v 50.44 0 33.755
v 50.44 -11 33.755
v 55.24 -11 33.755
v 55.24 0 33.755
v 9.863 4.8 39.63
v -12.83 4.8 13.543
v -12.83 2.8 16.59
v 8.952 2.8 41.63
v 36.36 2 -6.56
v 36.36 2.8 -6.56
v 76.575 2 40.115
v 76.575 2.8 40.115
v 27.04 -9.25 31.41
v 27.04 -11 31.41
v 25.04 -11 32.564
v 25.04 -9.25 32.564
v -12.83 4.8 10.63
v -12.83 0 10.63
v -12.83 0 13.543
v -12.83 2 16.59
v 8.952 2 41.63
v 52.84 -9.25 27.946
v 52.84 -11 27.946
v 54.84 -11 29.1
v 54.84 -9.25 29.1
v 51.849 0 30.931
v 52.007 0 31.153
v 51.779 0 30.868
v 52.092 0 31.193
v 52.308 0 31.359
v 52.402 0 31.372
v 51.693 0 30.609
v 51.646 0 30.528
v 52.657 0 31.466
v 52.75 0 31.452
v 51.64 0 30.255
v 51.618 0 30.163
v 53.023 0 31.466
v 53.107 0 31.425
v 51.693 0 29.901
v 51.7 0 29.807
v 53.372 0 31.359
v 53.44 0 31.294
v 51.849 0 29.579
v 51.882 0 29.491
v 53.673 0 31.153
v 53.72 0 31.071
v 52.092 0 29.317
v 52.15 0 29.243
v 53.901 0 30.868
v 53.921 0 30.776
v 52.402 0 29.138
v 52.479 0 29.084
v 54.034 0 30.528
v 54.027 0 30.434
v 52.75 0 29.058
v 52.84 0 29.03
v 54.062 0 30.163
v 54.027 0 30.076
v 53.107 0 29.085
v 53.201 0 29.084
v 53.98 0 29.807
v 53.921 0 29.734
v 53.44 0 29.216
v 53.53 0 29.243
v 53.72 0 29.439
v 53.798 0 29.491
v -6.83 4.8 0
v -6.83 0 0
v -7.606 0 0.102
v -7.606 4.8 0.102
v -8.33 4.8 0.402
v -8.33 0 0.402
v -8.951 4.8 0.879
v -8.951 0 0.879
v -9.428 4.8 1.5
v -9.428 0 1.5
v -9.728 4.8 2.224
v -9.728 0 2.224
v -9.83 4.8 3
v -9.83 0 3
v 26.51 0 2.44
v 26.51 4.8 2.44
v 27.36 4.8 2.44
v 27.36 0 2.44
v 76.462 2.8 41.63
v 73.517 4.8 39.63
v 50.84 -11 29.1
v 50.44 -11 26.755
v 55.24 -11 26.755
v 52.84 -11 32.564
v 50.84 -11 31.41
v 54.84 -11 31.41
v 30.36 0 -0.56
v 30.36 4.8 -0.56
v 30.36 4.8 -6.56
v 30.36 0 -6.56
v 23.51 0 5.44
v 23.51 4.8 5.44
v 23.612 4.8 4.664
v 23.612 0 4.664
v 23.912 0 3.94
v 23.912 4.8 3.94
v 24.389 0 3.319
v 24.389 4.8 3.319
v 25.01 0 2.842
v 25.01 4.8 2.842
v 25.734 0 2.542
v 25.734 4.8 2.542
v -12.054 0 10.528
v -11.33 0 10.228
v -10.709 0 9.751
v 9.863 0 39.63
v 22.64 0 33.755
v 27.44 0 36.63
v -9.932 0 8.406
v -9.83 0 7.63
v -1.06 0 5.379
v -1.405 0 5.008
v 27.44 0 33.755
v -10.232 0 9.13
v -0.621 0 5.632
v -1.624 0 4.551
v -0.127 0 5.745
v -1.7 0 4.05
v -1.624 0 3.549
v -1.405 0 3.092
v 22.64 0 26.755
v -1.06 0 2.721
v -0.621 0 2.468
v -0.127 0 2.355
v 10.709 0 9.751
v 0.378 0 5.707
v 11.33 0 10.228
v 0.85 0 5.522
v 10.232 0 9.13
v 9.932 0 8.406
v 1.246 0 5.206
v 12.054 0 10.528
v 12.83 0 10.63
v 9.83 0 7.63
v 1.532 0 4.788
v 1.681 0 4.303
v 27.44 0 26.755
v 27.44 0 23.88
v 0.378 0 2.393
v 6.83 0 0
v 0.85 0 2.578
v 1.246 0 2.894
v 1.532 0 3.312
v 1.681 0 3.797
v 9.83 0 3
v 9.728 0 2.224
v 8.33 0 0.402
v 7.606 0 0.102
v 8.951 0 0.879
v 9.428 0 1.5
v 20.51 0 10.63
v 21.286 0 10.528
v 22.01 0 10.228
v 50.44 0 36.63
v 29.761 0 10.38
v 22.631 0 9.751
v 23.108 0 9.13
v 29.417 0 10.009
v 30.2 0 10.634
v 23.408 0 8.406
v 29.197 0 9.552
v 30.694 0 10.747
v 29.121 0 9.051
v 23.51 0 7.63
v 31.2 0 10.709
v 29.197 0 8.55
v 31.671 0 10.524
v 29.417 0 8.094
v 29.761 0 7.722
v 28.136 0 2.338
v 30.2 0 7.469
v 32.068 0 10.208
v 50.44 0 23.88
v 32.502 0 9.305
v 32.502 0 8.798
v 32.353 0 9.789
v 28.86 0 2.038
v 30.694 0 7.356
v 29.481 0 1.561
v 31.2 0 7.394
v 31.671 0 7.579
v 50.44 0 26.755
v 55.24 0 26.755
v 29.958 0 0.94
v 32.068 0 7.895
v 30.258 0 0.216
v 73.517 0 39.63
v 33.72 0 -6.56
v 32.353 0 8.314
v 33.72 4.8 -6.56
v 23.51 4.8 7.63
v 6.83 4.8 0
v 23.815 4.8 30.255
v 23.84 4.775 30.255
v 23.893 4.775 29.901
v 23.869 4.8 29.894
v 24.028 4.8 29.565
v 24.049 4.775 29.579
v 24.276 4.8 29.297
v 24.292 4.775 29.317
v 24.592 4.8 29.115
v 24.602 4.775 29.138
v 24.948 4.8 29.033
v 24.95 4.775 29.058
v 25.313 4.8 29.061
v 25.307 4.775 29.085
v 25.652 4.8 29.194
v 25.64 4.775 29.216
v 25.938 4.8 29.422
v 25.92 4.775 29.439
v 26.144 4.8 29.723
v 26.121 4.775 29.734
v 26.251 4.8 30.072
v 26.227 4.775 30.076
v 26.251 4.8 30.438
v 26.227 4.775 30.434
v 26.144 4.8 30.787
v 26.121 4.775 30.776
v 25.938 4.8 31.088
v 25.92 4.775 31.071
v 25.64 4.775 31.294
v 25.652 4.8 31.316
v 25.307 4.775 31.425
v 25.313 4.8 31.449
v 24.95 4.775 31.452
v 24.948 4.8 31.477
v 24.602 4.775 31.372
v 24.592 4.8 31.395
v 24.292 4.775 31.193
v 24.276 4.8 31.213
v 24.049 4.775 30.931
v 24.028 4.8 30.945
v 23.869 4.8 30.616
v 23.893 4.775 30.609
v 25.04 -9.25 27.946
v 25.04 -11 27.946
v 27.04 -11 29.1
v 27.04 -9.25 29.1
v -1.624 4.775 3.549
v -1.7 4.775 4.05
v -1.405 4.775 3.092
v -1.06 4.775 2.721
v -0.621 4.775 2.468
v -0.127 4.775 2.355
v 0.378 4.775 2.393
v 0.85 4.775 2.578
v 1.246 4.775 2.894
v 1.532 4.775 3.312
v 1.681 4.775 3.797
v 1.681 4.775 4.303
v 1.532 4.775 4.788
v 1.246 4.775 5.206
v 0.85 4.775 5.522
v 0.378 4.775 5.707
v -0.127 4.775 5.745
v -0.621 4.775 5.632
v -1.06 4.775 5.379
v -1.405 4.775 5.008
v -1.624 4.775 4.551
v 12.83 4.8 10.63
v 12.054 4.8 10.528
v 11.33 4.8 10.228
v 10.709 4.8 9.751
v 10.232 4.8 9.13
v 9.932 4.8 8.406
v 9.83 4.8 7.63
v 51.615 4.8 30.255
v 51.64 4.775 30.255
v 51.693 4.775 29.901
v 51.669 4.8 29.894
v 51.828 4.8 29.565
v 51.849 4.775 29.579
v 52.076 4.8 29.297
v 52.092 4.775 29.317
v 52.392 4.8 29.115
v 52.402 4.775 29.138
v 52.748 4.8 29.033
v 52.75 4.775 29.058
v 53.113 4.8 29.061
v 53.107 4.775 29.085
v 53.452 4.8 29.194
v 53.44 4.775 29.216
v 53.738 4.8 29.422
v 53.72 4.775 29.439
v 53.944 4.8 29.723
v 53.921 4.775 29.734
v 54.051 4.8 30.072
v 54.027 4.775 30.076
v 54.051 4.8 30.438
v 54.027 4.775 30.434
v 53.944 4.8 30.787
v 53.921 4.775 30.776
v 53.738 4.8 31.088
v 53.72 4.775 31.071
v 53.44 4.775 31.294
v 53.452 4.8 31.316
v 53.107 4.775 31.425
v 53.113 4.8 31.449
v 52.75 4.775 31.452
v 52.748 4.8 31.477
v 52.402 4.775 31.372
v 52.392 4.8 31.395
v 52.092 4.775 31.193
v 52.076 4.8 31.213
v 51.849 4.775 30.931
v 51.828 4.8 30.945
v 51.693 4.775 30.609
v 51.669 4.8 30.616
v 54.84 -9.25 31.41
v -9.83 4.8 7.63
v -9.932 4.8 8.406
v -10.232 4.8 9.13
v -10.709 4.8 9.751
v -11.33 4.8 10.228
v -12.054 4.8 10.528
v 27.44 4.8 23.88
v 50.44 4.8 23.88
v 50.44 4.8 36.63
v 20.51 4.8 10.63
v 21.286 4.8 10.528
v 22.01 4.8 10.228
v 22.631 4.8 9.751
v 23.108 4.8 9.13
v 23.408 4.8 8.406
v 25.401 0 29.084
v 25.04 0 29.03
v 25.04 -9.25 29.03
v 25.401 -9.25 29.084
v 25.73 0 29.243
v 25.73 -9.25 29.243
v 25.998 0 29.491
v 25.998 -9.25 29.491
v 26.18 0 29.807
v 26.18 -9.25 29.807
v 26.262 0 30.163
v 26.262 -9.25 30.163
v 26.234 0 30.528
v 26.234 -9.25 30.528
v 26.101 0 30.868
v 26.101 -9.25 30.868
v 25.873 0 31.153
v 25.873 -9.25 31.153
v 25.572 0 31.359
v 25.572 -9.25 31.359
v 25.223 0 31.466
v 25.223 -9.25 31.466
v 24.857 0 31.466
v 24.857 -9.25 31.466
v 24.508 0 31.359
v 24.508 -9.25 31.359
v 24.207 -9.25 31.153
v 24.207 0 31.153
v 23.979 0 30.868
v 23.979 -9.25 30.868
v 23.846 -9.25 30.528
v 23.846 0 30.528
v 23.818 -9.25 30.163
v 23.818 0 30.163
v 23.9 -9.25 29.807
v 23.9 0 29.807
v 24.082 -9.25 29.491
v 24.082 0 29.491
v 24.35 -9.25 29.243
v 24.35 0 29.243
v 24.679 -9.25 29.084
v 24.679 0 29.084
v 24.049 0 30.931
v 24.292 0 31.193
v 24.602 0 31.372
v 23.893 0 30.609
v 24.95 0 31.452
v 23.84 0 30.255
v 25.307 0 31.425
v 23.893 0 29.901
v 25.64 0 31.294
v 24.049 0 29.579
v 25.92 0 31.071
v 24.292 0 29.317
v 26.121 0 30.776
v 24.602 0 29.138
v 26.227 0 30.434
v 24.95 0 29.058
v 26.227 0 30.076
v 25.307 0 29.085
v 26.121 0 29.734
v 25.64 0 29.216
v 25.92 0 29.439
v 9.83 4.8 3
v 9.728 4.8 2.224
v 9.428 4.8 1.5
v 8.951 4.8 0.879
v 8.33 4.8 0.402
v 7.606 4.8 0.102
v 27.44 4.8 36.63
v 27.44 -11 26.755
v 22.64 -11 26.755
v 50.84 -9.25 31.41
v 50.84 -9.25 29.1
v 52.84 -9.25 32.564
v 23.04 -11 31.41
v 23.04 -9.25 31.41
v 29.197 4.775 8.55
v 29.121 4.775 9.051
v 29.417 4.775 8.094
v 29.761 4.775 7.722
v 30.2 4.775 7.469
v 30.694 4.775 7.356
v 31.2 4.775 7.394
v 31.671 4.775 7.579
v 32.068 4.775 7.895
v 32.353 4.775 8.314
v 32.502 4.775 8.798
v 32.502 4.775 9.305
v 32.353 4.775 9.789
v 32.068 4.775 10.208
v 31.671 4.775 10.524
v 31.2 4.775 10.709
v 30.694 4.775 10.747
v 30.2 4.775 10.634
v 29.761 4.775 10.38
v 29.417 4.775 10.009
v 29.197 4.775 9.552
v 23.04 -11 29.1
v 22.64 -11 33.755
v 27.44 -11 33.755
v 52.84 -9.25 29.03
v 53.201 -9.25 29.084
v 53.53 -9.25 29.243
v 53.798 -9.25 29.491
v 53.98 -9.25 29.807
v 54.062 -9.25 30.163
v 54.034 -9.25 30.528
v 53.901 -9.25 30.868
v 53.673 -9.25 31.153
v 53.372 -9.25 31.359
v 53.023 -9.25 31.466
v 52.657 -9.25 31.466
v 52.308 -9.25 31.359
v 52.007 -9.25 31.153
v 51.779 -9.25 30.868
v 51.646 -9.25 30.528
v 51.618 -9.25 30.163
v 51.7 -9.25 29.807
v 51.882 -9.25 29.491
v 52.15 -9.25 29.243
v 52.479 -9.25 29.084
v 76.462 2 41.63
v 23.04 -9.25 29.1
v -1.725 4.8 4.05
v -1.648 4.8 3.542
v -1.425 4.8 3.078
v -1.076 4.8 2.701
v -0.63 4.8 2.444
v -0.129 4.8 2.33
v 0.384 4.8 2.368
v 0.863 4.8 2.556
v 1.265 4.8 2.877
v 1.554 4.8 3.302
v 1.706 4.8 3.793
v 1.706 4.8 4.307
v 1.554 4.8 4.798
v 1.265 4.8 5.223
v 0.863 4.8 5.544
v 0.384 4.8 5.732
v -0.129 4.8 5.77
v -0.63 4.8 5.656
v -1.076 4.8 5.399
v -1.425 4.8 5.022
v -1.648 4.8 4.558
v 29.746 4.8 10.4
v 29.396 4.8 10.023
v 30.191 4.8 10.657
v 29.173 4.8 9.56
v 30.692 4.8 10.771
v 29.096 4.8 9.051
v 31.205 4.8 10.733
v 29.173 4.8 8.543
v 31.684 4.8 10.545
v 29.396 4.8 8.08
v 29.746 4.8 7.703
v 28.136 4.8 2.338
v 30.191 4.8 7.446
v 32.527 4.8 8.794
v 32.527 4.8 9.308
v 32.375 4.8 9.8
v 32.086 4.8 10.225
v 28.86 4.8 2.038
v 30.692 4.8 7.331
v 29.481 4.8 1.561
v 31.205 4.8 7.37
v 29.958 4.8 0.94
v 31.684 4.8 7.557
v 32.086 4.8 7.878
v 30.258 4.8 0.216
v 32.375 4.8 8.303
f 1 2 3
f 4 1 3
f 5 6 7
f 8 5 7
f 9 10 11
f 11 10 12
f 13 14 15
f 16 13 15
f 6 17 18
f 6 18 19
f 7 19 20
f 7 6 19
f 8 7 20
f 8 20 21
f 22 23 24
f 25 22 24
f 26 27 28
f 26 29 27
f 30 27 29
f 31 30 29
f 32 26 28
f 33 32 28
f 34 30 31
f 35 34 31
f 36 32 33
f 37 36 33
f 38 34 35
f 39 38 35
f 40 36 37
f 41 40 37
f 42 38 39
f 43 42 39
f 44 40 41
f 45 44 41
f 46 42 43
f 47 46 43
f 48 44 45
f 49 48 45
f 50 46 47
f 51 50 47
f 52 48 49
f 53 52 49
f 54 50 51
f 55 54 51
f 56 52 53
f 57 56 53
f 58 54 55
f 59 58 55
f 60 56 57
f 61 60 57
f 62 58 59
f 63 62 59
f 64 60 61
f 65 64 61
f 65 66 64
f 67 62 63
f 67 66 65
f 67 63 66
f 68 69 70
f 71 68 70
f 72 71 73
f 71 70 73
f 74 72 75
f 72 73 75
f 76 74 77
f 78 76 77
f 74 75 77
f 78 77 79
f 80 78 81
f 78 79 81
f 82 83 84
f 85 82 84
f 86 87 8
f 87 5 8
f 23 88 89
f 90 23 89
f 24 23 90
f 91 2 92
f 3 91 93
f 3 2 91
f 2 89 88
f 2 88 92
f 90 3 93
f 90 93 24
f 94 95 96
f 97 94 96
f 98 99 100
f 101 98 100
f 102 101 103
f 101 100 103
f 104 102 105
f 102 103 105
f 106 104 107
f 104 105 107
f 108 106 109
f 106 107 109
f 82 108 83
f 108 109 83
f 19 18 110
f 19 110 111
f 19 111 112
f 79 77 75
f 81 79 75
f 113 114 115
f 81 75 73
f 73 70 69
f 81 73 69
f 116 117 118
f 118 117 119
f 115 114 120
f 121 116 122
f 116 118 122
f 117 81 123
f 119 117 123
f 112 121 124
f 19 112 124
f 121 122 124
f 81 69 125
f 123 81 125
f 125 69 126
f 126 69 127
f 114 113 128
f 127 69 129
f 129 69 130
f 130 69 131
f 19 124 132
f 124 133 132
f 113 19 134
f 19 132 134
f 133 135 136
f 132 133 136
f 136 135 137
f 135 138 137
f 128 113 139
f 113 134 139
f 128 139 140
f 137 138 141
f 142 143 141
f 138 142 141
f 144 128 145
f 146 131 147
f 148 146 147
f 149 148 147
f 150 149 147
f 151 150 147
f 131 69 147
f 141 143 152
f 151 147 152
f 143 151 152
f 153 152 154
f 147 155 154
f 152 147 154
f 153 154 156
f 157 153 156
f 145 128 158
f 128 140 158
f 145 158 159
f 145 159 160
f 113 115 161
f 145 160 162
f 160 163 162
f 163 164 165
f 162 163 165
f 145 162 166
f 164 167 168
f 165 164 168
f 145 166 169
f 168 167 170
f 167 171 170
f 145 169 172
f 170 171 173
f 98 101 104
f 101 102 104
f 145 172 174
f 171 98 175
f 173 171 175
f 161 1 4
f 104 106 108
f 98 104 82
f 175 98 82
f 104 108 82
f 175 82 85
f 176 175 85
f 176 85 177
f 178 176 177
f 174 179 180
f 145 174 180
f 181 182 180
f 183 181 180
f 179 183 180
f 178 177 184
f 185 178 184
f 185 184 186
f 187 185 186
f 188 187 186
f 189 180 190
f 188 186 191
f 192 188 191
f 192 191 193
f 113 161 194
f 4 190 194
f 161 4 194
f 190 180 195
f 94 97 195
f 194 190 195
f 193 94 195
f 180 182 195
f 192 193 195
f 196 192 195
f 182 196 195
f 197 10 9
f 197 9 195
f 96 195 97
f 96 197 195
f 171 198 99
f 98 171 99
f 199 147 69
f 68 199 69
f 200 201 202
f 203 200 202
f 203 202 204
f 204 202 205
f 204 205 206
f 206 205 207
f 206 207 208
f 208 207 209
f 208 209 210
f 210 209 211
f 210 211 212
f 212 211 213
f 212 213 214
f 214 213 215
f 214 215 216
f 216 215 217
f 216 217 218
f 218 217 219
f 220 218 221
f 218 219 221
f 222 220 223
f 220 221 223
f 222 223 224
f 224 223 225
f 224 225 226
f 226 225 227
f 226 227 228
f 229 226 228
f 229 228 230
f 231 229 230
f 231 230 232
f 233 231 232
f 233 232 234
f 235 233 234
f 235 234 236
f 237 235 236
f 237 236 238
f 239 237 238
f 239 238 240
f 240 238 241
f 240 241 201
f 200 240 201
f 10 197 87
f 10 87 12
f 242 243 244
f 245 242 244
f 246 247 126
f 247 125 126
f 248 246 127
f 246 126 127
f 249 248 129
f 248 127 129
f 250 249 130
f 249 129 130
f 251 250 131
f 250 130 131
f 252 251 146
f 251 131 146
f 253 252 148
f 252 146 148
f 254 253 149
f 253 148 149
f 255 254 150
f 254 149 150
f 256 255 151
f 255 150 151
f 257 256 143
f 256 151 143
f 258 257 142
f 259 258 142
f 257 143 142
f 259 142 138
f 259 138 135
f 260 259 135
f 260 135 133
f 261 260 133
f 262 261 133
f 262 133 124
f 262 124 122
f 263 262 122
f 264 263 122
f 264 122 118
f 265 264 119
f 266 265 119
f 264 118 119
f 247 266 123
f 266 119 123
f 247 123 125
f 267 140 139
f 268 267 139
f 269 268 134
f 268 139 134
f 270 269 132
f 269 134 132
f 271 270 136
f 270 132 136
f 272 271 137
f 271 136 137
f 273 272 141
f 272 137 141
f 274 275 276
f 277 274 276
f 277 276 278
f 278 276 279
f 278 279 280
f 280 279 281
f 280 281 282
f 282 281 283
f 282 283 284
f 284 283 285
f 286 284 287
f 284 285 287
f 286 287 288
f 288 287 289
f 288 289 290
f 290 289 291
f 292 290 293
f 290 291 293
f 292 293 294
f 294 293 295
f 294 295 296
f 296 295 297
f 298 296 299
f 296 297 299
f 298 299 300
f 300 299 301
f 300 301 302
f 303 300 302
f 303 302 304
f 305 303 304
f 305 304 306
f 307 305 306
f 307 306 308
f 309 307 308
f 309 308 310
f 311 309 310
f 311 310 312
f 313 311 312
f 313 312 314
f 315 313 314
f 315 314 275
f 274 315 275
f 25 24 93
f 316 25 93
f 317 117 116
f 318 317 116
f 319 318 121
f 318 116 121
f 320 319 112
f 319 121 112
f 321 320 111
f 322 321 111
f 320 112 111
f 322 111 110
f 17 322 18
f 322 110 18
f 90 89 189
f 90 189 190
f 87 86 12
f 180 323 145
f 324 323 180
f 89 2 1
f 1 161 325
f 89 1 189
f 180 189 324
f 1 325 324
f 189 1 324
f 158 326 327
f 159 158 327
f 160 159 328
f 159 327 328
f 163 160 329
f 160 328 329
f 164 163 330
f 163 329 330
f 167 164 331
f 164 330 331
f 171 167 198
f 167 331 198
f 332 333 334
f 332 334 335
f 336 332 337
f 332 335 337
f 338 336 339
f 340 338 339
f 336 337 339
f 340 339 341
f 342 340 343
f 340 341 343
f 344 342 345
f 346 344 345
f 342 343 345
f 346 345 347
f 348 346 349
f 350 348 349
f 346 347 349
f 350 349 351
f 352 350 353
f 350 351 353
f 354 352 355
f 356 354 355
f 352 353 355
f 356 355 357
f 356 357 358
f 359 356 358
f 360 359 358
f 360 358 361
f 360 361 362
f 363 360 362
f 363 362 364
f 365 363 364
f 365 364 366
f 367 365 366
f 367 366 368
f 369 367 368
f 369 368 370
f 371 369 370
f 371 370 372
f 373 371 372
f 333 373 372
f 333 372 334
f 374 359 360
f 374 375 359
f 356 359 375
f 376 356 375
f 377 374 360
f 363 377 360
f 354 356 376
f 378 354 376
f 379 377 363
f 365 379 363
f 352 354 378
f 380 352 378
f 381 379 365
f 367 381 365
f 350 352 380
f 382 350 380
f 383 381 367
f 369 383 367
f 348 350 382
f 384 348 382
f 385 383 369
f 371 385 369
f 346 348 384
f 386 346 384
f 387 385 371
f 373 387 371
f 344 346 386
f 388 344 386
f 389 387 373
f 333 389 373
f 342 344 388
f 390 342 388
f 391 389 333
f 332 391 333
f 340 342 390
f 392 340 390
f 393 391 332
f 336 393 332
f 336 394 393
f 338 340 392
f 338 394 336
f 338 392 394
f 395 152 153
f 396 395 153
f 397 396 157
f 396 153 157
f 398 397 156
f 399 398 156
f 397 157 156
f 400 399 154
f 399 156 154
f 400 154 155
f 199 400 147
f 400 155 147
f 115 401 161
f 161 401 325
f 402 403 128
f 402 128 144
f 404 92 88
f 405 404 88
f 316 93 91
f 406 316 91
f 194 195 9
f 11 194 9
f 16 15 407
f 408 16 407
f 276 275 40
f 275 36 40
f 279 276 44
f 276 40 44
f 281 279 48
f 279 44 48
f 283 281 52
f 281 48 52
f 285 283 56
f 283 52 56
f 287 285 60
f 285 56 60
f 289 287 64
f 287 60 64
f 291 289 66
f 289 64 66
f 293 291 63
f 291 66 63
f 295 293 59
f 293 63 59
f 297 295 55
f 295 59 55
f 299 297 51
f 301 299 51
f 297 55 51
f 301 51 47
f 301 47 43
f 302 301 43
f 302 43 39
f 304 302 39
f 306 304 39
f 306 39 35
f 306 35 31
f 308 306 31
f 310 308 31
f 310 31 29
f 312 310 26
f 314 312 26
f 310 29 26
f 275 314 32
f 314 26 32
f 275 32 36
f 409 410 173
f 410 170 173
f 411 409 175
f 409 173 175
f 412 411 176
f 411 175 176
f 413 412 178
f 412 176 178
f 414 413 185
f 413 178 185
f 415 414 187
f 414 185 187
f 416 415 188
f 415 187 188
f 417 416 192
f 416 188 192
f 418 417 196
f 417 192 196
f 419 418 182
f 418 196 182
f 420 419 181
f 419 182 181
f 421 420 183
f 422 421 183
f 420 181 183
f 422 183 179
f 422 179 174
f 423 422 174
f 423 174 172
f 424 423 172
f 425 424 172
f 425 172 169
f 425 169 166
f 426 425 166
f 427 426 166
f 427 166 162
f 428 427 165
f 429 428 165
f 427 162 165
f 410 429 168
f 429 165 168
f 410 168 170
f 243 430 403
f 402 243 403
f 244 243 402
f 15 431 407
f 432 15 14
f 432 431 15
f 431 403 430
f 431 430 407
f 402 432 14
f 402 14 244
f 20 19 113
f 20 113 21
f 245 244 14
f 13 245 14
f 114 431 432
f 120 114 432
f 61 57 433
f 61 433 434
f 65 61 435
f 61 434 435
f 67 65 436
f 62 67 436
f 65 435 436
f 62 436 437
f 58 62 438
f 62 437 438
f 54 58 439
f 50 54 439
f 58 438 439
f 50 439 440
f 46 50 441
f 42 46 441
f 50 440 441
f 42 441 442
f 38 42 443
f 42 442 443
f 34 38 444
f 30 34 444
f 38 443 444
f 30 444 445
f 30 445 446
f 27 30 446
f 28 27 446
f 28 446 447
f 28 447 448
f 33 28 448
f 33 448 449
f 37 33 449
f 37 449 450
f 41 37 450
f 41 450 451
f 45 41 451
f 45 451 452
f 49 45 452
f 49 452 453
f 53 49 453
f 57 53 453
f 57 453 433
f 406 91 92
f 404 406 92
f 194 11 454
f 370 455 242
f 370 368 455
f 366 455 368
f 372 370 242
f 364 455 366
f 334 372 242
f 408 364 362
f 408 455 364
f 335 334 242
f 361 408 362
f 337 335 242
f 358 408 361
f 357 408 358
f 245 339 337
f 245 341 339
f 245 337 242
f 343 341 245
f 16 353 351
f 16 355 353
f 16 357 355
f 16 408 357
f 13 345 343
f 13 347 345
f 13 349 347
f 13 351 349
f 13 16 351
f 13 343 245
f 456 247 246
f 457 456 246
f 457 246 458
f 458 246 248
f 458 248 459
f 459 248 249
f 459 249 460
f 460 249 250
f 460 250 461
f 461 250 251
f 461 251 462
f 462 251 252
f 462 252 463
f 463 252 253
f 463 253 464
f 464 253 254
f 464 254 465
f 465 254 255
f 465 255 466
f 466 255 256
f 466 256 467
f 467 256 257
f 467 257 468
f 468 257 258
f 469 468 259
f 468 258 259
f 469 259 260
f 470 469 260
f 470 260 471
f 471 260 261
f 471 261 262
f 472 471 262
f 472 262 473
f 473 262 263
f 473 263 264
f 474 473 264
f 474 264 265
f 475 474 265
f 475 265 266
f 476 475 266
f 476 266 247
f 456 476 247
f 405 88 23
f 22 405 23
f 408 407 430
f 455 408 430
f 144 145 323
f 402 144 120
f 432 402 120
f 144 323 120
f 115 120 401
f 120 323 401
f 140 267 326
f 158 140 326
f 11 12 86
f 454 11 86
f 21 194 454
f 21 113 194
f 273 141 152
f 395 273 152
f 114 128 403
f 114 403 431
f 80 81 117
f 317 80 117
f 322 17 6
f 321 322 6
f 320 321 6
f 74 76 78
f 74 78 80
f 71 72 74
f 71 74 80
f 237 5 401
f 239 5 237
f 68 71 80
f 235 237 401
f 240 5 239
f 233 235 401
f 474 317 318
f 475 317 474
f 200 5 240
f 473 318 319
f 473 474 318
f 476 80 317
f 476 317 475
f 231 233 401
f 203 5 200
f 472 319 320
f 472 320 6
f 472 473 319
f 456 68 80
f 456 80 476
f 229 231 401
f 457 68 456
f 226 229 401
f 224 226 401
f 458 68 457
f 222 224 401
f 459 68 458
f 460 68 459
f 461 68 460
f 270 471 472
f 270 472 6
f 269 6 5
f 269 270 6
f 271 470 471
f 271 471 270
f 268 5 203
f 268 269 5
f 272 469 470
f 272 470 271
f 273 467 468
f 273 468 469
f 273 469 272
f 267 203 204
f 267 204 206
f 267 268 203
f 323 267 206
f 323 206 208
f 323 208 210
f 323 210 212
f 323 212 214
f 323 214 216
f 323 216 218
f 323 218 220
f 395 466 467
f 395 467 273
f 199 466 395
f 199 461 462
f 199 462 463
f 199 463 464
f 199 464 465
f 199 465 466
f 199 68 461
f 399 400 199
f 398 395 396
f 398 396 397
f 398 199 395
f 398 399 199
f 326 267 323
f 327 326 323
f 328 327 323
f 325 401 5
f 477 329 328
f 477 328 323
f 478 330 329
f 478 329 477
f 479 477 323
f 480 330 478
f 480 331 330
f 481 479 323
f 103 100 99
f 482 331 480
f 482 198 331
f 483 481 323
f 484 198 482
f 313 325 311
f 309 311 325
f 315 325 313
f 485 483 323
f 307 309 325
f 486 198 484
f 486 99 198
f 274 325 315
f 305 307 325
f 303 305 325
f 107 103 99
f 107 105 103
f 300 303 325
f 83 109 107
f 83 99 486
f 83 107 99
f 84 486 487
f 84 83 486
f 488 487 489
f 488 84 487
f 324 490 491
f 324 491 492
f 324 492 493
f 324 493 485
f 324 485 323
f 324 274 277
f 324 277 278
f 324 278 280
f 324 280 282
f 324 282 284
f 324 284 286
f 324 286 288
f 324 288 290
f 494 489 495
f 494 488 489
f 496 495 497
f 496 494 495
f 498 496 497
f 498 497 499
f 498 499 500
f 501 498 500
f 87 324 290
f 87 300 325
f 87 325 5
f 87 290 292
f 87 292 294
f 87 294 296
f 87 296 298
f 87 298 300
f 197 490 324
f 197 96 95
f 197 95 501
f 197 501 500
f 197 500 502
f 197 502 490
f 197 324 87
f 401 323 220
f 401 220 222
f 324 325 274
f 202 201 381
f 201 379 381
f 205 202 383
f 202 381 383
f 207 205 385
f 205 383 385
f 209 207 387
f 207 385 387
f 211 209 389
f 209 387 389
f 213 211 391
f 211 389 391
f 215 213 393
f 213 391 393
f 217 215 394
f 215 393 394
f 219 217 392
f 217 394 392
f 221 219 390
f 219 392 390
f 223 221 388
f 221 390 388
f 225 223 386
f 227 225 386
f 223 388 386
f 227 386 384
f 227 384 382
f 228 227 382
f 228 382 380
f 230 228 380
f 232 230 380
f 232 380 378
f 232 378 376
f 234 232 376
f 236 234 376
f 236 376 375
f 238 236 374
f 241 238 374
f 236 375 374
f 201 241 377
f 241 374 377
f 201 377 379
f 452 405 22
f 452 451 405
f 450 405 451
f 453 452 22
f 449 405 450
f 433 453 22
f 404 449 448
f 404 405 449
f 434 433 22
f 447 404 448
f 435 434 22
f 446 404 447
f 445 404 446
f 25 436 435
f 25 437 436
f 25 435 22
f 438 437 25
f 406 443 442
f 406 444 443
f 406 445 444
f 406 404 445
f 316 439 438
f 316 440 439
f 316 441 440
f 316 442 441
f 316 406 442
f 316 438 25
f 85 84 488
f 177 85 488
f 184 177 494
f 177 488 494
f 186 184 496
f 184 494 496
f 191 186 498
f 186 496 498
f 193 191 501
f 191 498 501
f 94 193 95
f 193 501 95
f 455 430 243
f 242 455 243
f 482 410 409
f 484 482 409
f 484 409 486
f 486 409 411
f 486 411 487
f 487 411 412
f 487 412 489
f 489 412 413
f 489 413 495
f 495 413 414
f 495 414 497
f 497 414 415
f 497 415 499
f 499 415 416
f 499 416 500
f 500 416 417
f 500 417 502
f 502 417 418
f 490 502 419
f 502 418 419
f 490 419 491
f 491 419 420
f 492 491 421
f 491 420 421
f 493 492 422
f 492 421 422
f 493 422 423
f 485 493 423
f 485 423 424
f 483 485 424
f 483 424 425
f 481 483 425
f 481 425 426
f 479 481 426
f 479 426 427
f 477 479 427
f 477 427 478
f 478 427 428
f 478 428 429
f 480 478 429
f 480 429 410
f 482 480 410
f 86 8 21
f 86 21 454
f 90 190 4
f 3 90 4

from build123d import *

# Parameters (mm, degrees)
BOSS_EXTRUDE1_DEPTH            = 4.8
BOSS_EXTRUDE3_DEPTH            = 4.8
M3_CLEARANCE_HOLE2_D           = 3.4
M3_CLEARANCE_HOLE2_CSINK_D     = 3.45
M3_CLEARANCE_HOLE2_CSINK_ANGLE = 90
BOSS_EXTRUDE4_DEPTH            = 4.8
SKETCH11_W                     = 23
SKETCH11_H                     = 12.75
CUT_EXTRUDE1_DEPTH             = 4.8
M2_CLEARANCE_HOLE1_D           = 2.4
M2_CLEARANCE_HOLE1_CSINK_D     = 2.45
M2_CLEARANCE_HOLE1_CSINK_ANGLE = 90
CUT_EXTRUDE2_DEPTH             = 4.8
SKETCH16_W                     = 4.8
SKETCH16_H                     = 7
BOSS_EXTRUDE6_DEPTH            = 11
SKETCH17_R                     = 1.225
CUT_EXTRUDE3_DEPTH             = 11
CUT_EXTRUDE4_DEPTH             = 1.75


with BuildPart() as part:
    # Sketch1 → Boss-Extrude1 (new body)
    with BuildSketch(Plane(origin=(0, 0, 0), x_dir=(1, 0, 0), z_dir=(0, 1, 0))):
        with BuildLine():
            Line((6.83, 0), (-6.83, 0))
            ThreePointArc((-6.83, 0), (-8.951320344, -0.878679656), (-9.83, -3))
            Line((-9.83, -3), (-9.83, -7.63))
            ThreePointArc((-9.83, -7.63), (-10.708679656, -9.751320344), (-12.83, -10.63))
            Line((-12.83, -10.63), (-12.83, -16.63))
            Line((-12.83, -16.63), (12.83, -16.63))
            Line((12.83, -16.63), (12.83, -10.63))
            ThreePointArc((12.83, -10.63), (10.708679656, -9.751320344), (9.83, -7.63))
            Line((9.83, -7.63), (9.83, -3))
            ThreePointArc((9.83, -3), (8.951320344, -0.878679656), (6.83, 0))
        make_face()
    extrude(amount=BOSS_EXTRUDE1_DEPTH)

    # Sketch9 → Boss-Extrude3 (add)
    with BuildSketch(Plane(origin=(0, 4.8, 0), x_dir=(1, 0, 0), z_dir=(0, 1, 0))):
        with BuildLine():
            Line((12.83, -16.63), (12.83, -10.63))
            Line((12.83, -10.63), (20.51, -10.63))
            ThreePointArc((20.51, -10.63), (22.631320344, -9.751320344), (23.51, -7.63))
            Line((23.51, -7.63), (23.51, -5.44))
            ThreePointArc((23.51, -5.44), (24.388679656, -3.318679656), (26.51, -2.44))
            Line((26.51, -2.44), (27.36, -2.44))
            ThreePointArc((27.36, -2.44), (29.481320344, -1.561320344), (30.36, 0.56))
            Line((30.36, 0.56), (30.36, 6.56))
            Line((30.36, 6.56), (36.36, 6.56))
            Line((36.36, 6.56), (36.36, -16.63))
            Line((36.36, -16.63), (12.83, -16.63))
        make_face()
    extrude(amount=-BOSS_EXTRUDE3_DEPTH)

    # M3 Clearance Hole2 (through all)
    with Locations(Plane(origin=(0, 4.8, 0), x_dir=(1, 0, 0), z_dir=(0, 1, 0))):
        with Locations((0, -4.05), (30.821320344, -9.051320344)):
            CounterSinkHole(M3_CLEARANCE_HOLE2_D / 2, M3_CLEARANCE_HOLE2_CSINK_D / 2, counter_sink_angle=M3_CLEARANCE_HOLE2_CSINK_ANGLE)

    # Sketch10 → Boss-Extrude4 (add)
    with BuildSketch(Plane(origin=(0, 4.8, 0), x_dir=(1, 0, 0), z_dir=(0, 1, 0))):
        Polygon((-12.83, -16.63), (-12.83, -41.63), (77.88, -41.63), (77.88, 6.56), (36.36, 6.56), (36.36, -16.63), align=None)
    extrude(amount=-BOSS_EXTRUDE4_DEPTH)

    # Sketch11 → Cut-Extrude1 (cut)
    with BuildSketch(Plane(origin=(0, 4.8, 0), x_dir=(1, 0, 0), z_dir=(0, 1, 0))):
        with Locations((38.94, -30.255)):
            Rectangle(SKETCH11_W, SKETCH11_H)
    extrude(amount=-CUT_EXTRUDE1_DEPTH, mode=Mode.SUBTRACT)

    # M2 Clearance Hole1 (through all)
    with Locations(Plane(origin=(0, 4.8, 0), x_dir=(1, 0, 0), z_dir=(0, 1, 0))):
        with Locations((25.04, -30.255), (52.84, -30.255)):
            CounterSinkHole(M2_CLEARANCE_HOLE1_D / 2, M2_CLEARANCE_HOLE1_CSINK_D / 2, counter_sink_angle=M2_CLEARANCE_HOLE1_CSINK_ANGLE)

    # Sketch14 → Cut-Extrude2 (cut)
    with BuildSketch(Plane(origin=(0, 4.8, 0), x_dir=(1, 0, 0), z_dir=(0, 1, 0))):
        Polygon((-12.83, -16.59), (8.952290106, -41.63), (-12.83, -41.63), align=None)
        Polygon((36.36, 6.56), (77.88, -41.63), (77.88, 6.56), align=None)
    extrude(amount=-CUT_EXTRUDE2_DEPTH, mode=Mode.SUBTRACT)

    # Chamfer2
    # the kernel refuses this chamfer: 2, 1.418117079 mm, written as the material it takes off along each edge
    with BuildSketch(Plane(origin=(75.517763148, 3.466666667, 40.45827363), x_dir=(-0.07414602746519786, 0, 0.9972473948881141), z_dir=(0.5424620475376688, 0.83911156735298, 0.040332425115101794))) as chamfer2_piece_1:
        Polygon((-0.420862971, 1.22558177), (1.098498339, 1.22558177), (-0.677635367, -2.451163541), align=None)
    extrude(amount=2.692247612, mode=Mode.SUBTRACT)
    with BuildSketch(Plane(origin=(75.517763148, 1.333333333, 40.45827363), x_dir=(-0.07414602746519786, 0, 0.9972473948881141), z_dir=(0.5424620475376688, -0.83911156735298, 0.040332425115102044))) as chamfer2_piece_2:
        Polygon((-0.420862971, -1.22558177), (1.098498339, -1.22558177), (-0.677635367, 2.451163541), align=None)
    extrude(amount=2.692247612, mode=Mode.SUBTRACT)
    with BuildSketch(Plane(origin=(3.80892413, 4.8, 41.63), x_dir=(0, 0.02749587661058651, -0.9996219169112968), z_dir=(1, 0, 0))) as chamfer2_piece_3:
        with BuildLine():
            Line((2.05734639, 0), (-0.11309431, -2.054235587))
            Line((-0.11309431, -2.054235587), (-0.153079186, -2.053135752))
            ThreePointArc((-0.153079186, -2.053135752), (-0.068258454, -1.026795659), (-0.039984877, 0.001099835))
            Line((-0.039984877, 0.001099835), (0.001099835, 0.039984877))
            ThreePointArc((0.001099835, 0.039984877), (1.028995329, 0.011711299), (2.058446225, 0.039984877))
            Line((2.058446225, 0.039984877), (2.05734639, 0))
        make_face()
    extrude(amount=79.214441846, mode=Mode.SUBTRACT)
    with BuildSketch(Plane(origin=(-16.205706468, 4.8, 12.709430531), x_dir=(0.7541952701172161, 0.027495876610586487, -0.6560742879447683), z_dir=(0.6563224323571792, 0, 0.754480526445021))) as chamfer2_piece_4:
        with BuildLine():
            Line((2.05734639, 0), (-0.11309431, -2.054235587))
            Line((-0.11309431, -2.054235587), (-0.153079186, -2.053135752))
            ThreePointArc((-0.153079186, -2.053135752), (-0.068258454, -1.026795659), (-0.039984877, 0.001099835))
            Line((-0.039984877, 0.001099835), (0.001099835, 0.039984877))
            ThreePointArc((0.001099835, 0.039984877), (1.028995329, 0.011711299), (2.058446225, 0.039984877))
            Line((2.058446225, 0.039984877), (2.05734639, 0))
        make_face()
    extrude(amount=43.475129959, mode=Mode.SUBTRACT)
    with BuildSketch(Plane(origin=(-16.205706468, 0, 12.709430531), x_dir=(0.7541952701172161, -0.02749587661058636, -0.6560742879447683), z_dir=(0.6563224323571792, 0, 0.754480526445021))) as chamfer2_piece_5:
        with BuildLine():
            Line((2.05734639, 0), (-0.11309431, 2.054235587))
            Line((-0.11309431, 2.054235587), (-0.153079186, 2.053135752))
            ThreePointArc((-0.153079186, 2.053135752), (-0.068258454, 1.026795659), (-0.039984877, -0.001099835))
            Line((-0.039984877, -0.001099835), (0.001099835, -0.039984877))
            ThreePointArc((0.001099835, -0.039984877), (1.028995329, -0.011711299), (2.058446225, -0.039984877))
            Line((2.058446225, -0.039984877), (2.05734639, 0))
        make_face()
    extrude(amount=43.475129959, mode=Mode.SUBTRACT)
    with BuildSketch(Plane(origin=(33.002764366, 4.8, -10.456560337), x_dir=(-0.7573031224660502, 0.027495876610586473, 0.6524844499852744), z_dir=(0.6527312366273116, 0, 0.757589554264696))) as chamfer2_piece_6:
        with BuildLine():
            Line((2.05734639, 0), (-0.11309431, 2.054235587))
            Line((-0.11309431, 2.054235587), (-0.153079186, 2.053135752))
            ThreePointArc((-0.153079186, 2.053135752), (-0.068258454, 1.026795659), (-0.039984877, -0.001099835))
            Line((-0.039984877, -0.001099835), (0.001099835, -0.039984877))
            ThreePointArc((0.001099835, -0.039984877), (1.028995329, -0.011711299), (2.058446225, -0.039984877))
            Line((2.058446225, -0.039984877), (2.05734639, 0))
        make_face()
    extrude(amount=73.896373517, mode=Mode.SUBTRACT)
    with BuildSketch(Plane(origin=(33.002764366, 0, -10.456560337), x_dir=(-0.7573031224660502, -0.02749587661058634, 0.6524844499852744), z_dir=(0.6527312366273116, 0, 0.757589554264696))) as chamfer2_piece_7:
        with BuildLine():
            Line((2.05734639, 0), (-0.11309431, -2.054235587))
            Line((-0.11309431, -2.054235587), (-0.153079186, -2.053135752))
            ThreePointArc((-0.153079186, -2.053135752), (-0.068258454, -1.026795659), (-0.039984877, 0.001099835))
            Line((-0.039984877, 0.001099835), (0.001099835, 0.039984877))
            ThreePointArc((0.001099835, 0.039984877), (1.028995329, 0.011711299), (2.058446225, 0.039984877))
            Line((2.058446225, 0.039984877), (2.05734639, 0))
        make_face()
    extrude(amount=73.896373517, mode=Mode.SUBTRACT)
    with BuildSketch(Plane(origin=(77.88, 9.943365976, 41.63), x_dir=(-0.6316538610797438, 0, -0.7752505400082296), z_dir=(0, -1, 0))) as chamfer2_piece_8:
        with BuildLine():
            Line((2.05734639, 0), (0.837656572, -1.154387784))
            Line((0.837656572, -1.154387784), (0.80664655, -1.179653939))
            ThreePointArc((0.80664655, -1.179653939), (0.418742927, -0.57726344), (-0.031010022, -0.025266154))
            Line((-0.031010022, -0.025266154), (0.001099835, 0.039984877))
            ThreePointArc((0.001099835, 0.039984877), (1.028995329, 0.011711299), (2.058446225, 0.039984877))
            Line((2.058446225, 0.039984877), (2.05734639, 0))
        make_face()
    extrude(amount=15.086731952, mode=Mode.SUBTRACT)
    with BuildSketch(Plane(origin=(3.80892413, 0, 41.63), x_dir=(0, -0.02749587661058639, -0.9996219169112968), z_dir=(1, 0, 0))) as chamfer2_piece_9:
        with BuildLine():
            Line((2.05734639, 0), (-0.11309431, 2.054235587))
            Line((-0.11309431, 2.054235587), (-0.153079186, 2.053135752))
            ThreePointArc((-0.153079186, 2.053135752), (-0.068258454, 1.026795659), (-0.039984877, -0.001099835))
            Line((-0.039984877, -0.001099835), (0.001099835, -0.039984877))
            ThreePointArc((0.001099835, -0.039984877), (1.028995329, -0.011711299), (2.058446225, -0.039984877))
            Line((2.058446225, -0.039984877), (2.05734639, 0))
        make_face()
    extrude(amount=79.214441846, mode=Mode.SUBTRACT)

    # Sketch16 → Boss-Extrude6 (add)
    with BuildSketch(Plane.XZ):
        with Locations((25.04, 30.255)):
            Rectangle(SKETCH16_W, SKETCH16_H)
        with Locations((52.84, 30.255)):
            Rectangle(SKETCH16_W, SKETCH16_H)
    extrude(amount=BOSS_EXTRUDE6_DEPTH)

    # Sketch17 → Cut-Extrude3 (cut)
    with BuildSketch(Plane.XZ.offset(11)):
        with Locations(Location((25.04, 30.255, 0), (0, 0, 270))):
            Circle(SKETCH17_R)
        with Locations(Location((52.84, 30.255, 0), (0, 0, 270))):
            Circle(SKETCH17_R)
    extrude(amount=-CUT_EXTRUDE3_DEPTH, mode=Mode.SUBTRACT)

    # Sketch18 → Cut-Extrude4 (cut)
    with BuildSketch(Plane.XZ.offset(11)):
        Polygon((25.04, 27.945598923), (27.04, 29.100299462), (27.04, 31.409700538), (25.04, 32.564401077), (23.04, 31.409700538), (23.04, 29.100299462), align=None)
        Polygon((52.84, 27.945598923), (54.84, 29.100299462), (54.84, 31.409700538), (52.84, 32.564401077), (50.84, 31.409700538), (50.84, 29.100299462), align=None)
    extrude(amount=-CUT_EXTRUDE4_DEPTH, mode=Mode.SUBTRACT)


solid = part.part
